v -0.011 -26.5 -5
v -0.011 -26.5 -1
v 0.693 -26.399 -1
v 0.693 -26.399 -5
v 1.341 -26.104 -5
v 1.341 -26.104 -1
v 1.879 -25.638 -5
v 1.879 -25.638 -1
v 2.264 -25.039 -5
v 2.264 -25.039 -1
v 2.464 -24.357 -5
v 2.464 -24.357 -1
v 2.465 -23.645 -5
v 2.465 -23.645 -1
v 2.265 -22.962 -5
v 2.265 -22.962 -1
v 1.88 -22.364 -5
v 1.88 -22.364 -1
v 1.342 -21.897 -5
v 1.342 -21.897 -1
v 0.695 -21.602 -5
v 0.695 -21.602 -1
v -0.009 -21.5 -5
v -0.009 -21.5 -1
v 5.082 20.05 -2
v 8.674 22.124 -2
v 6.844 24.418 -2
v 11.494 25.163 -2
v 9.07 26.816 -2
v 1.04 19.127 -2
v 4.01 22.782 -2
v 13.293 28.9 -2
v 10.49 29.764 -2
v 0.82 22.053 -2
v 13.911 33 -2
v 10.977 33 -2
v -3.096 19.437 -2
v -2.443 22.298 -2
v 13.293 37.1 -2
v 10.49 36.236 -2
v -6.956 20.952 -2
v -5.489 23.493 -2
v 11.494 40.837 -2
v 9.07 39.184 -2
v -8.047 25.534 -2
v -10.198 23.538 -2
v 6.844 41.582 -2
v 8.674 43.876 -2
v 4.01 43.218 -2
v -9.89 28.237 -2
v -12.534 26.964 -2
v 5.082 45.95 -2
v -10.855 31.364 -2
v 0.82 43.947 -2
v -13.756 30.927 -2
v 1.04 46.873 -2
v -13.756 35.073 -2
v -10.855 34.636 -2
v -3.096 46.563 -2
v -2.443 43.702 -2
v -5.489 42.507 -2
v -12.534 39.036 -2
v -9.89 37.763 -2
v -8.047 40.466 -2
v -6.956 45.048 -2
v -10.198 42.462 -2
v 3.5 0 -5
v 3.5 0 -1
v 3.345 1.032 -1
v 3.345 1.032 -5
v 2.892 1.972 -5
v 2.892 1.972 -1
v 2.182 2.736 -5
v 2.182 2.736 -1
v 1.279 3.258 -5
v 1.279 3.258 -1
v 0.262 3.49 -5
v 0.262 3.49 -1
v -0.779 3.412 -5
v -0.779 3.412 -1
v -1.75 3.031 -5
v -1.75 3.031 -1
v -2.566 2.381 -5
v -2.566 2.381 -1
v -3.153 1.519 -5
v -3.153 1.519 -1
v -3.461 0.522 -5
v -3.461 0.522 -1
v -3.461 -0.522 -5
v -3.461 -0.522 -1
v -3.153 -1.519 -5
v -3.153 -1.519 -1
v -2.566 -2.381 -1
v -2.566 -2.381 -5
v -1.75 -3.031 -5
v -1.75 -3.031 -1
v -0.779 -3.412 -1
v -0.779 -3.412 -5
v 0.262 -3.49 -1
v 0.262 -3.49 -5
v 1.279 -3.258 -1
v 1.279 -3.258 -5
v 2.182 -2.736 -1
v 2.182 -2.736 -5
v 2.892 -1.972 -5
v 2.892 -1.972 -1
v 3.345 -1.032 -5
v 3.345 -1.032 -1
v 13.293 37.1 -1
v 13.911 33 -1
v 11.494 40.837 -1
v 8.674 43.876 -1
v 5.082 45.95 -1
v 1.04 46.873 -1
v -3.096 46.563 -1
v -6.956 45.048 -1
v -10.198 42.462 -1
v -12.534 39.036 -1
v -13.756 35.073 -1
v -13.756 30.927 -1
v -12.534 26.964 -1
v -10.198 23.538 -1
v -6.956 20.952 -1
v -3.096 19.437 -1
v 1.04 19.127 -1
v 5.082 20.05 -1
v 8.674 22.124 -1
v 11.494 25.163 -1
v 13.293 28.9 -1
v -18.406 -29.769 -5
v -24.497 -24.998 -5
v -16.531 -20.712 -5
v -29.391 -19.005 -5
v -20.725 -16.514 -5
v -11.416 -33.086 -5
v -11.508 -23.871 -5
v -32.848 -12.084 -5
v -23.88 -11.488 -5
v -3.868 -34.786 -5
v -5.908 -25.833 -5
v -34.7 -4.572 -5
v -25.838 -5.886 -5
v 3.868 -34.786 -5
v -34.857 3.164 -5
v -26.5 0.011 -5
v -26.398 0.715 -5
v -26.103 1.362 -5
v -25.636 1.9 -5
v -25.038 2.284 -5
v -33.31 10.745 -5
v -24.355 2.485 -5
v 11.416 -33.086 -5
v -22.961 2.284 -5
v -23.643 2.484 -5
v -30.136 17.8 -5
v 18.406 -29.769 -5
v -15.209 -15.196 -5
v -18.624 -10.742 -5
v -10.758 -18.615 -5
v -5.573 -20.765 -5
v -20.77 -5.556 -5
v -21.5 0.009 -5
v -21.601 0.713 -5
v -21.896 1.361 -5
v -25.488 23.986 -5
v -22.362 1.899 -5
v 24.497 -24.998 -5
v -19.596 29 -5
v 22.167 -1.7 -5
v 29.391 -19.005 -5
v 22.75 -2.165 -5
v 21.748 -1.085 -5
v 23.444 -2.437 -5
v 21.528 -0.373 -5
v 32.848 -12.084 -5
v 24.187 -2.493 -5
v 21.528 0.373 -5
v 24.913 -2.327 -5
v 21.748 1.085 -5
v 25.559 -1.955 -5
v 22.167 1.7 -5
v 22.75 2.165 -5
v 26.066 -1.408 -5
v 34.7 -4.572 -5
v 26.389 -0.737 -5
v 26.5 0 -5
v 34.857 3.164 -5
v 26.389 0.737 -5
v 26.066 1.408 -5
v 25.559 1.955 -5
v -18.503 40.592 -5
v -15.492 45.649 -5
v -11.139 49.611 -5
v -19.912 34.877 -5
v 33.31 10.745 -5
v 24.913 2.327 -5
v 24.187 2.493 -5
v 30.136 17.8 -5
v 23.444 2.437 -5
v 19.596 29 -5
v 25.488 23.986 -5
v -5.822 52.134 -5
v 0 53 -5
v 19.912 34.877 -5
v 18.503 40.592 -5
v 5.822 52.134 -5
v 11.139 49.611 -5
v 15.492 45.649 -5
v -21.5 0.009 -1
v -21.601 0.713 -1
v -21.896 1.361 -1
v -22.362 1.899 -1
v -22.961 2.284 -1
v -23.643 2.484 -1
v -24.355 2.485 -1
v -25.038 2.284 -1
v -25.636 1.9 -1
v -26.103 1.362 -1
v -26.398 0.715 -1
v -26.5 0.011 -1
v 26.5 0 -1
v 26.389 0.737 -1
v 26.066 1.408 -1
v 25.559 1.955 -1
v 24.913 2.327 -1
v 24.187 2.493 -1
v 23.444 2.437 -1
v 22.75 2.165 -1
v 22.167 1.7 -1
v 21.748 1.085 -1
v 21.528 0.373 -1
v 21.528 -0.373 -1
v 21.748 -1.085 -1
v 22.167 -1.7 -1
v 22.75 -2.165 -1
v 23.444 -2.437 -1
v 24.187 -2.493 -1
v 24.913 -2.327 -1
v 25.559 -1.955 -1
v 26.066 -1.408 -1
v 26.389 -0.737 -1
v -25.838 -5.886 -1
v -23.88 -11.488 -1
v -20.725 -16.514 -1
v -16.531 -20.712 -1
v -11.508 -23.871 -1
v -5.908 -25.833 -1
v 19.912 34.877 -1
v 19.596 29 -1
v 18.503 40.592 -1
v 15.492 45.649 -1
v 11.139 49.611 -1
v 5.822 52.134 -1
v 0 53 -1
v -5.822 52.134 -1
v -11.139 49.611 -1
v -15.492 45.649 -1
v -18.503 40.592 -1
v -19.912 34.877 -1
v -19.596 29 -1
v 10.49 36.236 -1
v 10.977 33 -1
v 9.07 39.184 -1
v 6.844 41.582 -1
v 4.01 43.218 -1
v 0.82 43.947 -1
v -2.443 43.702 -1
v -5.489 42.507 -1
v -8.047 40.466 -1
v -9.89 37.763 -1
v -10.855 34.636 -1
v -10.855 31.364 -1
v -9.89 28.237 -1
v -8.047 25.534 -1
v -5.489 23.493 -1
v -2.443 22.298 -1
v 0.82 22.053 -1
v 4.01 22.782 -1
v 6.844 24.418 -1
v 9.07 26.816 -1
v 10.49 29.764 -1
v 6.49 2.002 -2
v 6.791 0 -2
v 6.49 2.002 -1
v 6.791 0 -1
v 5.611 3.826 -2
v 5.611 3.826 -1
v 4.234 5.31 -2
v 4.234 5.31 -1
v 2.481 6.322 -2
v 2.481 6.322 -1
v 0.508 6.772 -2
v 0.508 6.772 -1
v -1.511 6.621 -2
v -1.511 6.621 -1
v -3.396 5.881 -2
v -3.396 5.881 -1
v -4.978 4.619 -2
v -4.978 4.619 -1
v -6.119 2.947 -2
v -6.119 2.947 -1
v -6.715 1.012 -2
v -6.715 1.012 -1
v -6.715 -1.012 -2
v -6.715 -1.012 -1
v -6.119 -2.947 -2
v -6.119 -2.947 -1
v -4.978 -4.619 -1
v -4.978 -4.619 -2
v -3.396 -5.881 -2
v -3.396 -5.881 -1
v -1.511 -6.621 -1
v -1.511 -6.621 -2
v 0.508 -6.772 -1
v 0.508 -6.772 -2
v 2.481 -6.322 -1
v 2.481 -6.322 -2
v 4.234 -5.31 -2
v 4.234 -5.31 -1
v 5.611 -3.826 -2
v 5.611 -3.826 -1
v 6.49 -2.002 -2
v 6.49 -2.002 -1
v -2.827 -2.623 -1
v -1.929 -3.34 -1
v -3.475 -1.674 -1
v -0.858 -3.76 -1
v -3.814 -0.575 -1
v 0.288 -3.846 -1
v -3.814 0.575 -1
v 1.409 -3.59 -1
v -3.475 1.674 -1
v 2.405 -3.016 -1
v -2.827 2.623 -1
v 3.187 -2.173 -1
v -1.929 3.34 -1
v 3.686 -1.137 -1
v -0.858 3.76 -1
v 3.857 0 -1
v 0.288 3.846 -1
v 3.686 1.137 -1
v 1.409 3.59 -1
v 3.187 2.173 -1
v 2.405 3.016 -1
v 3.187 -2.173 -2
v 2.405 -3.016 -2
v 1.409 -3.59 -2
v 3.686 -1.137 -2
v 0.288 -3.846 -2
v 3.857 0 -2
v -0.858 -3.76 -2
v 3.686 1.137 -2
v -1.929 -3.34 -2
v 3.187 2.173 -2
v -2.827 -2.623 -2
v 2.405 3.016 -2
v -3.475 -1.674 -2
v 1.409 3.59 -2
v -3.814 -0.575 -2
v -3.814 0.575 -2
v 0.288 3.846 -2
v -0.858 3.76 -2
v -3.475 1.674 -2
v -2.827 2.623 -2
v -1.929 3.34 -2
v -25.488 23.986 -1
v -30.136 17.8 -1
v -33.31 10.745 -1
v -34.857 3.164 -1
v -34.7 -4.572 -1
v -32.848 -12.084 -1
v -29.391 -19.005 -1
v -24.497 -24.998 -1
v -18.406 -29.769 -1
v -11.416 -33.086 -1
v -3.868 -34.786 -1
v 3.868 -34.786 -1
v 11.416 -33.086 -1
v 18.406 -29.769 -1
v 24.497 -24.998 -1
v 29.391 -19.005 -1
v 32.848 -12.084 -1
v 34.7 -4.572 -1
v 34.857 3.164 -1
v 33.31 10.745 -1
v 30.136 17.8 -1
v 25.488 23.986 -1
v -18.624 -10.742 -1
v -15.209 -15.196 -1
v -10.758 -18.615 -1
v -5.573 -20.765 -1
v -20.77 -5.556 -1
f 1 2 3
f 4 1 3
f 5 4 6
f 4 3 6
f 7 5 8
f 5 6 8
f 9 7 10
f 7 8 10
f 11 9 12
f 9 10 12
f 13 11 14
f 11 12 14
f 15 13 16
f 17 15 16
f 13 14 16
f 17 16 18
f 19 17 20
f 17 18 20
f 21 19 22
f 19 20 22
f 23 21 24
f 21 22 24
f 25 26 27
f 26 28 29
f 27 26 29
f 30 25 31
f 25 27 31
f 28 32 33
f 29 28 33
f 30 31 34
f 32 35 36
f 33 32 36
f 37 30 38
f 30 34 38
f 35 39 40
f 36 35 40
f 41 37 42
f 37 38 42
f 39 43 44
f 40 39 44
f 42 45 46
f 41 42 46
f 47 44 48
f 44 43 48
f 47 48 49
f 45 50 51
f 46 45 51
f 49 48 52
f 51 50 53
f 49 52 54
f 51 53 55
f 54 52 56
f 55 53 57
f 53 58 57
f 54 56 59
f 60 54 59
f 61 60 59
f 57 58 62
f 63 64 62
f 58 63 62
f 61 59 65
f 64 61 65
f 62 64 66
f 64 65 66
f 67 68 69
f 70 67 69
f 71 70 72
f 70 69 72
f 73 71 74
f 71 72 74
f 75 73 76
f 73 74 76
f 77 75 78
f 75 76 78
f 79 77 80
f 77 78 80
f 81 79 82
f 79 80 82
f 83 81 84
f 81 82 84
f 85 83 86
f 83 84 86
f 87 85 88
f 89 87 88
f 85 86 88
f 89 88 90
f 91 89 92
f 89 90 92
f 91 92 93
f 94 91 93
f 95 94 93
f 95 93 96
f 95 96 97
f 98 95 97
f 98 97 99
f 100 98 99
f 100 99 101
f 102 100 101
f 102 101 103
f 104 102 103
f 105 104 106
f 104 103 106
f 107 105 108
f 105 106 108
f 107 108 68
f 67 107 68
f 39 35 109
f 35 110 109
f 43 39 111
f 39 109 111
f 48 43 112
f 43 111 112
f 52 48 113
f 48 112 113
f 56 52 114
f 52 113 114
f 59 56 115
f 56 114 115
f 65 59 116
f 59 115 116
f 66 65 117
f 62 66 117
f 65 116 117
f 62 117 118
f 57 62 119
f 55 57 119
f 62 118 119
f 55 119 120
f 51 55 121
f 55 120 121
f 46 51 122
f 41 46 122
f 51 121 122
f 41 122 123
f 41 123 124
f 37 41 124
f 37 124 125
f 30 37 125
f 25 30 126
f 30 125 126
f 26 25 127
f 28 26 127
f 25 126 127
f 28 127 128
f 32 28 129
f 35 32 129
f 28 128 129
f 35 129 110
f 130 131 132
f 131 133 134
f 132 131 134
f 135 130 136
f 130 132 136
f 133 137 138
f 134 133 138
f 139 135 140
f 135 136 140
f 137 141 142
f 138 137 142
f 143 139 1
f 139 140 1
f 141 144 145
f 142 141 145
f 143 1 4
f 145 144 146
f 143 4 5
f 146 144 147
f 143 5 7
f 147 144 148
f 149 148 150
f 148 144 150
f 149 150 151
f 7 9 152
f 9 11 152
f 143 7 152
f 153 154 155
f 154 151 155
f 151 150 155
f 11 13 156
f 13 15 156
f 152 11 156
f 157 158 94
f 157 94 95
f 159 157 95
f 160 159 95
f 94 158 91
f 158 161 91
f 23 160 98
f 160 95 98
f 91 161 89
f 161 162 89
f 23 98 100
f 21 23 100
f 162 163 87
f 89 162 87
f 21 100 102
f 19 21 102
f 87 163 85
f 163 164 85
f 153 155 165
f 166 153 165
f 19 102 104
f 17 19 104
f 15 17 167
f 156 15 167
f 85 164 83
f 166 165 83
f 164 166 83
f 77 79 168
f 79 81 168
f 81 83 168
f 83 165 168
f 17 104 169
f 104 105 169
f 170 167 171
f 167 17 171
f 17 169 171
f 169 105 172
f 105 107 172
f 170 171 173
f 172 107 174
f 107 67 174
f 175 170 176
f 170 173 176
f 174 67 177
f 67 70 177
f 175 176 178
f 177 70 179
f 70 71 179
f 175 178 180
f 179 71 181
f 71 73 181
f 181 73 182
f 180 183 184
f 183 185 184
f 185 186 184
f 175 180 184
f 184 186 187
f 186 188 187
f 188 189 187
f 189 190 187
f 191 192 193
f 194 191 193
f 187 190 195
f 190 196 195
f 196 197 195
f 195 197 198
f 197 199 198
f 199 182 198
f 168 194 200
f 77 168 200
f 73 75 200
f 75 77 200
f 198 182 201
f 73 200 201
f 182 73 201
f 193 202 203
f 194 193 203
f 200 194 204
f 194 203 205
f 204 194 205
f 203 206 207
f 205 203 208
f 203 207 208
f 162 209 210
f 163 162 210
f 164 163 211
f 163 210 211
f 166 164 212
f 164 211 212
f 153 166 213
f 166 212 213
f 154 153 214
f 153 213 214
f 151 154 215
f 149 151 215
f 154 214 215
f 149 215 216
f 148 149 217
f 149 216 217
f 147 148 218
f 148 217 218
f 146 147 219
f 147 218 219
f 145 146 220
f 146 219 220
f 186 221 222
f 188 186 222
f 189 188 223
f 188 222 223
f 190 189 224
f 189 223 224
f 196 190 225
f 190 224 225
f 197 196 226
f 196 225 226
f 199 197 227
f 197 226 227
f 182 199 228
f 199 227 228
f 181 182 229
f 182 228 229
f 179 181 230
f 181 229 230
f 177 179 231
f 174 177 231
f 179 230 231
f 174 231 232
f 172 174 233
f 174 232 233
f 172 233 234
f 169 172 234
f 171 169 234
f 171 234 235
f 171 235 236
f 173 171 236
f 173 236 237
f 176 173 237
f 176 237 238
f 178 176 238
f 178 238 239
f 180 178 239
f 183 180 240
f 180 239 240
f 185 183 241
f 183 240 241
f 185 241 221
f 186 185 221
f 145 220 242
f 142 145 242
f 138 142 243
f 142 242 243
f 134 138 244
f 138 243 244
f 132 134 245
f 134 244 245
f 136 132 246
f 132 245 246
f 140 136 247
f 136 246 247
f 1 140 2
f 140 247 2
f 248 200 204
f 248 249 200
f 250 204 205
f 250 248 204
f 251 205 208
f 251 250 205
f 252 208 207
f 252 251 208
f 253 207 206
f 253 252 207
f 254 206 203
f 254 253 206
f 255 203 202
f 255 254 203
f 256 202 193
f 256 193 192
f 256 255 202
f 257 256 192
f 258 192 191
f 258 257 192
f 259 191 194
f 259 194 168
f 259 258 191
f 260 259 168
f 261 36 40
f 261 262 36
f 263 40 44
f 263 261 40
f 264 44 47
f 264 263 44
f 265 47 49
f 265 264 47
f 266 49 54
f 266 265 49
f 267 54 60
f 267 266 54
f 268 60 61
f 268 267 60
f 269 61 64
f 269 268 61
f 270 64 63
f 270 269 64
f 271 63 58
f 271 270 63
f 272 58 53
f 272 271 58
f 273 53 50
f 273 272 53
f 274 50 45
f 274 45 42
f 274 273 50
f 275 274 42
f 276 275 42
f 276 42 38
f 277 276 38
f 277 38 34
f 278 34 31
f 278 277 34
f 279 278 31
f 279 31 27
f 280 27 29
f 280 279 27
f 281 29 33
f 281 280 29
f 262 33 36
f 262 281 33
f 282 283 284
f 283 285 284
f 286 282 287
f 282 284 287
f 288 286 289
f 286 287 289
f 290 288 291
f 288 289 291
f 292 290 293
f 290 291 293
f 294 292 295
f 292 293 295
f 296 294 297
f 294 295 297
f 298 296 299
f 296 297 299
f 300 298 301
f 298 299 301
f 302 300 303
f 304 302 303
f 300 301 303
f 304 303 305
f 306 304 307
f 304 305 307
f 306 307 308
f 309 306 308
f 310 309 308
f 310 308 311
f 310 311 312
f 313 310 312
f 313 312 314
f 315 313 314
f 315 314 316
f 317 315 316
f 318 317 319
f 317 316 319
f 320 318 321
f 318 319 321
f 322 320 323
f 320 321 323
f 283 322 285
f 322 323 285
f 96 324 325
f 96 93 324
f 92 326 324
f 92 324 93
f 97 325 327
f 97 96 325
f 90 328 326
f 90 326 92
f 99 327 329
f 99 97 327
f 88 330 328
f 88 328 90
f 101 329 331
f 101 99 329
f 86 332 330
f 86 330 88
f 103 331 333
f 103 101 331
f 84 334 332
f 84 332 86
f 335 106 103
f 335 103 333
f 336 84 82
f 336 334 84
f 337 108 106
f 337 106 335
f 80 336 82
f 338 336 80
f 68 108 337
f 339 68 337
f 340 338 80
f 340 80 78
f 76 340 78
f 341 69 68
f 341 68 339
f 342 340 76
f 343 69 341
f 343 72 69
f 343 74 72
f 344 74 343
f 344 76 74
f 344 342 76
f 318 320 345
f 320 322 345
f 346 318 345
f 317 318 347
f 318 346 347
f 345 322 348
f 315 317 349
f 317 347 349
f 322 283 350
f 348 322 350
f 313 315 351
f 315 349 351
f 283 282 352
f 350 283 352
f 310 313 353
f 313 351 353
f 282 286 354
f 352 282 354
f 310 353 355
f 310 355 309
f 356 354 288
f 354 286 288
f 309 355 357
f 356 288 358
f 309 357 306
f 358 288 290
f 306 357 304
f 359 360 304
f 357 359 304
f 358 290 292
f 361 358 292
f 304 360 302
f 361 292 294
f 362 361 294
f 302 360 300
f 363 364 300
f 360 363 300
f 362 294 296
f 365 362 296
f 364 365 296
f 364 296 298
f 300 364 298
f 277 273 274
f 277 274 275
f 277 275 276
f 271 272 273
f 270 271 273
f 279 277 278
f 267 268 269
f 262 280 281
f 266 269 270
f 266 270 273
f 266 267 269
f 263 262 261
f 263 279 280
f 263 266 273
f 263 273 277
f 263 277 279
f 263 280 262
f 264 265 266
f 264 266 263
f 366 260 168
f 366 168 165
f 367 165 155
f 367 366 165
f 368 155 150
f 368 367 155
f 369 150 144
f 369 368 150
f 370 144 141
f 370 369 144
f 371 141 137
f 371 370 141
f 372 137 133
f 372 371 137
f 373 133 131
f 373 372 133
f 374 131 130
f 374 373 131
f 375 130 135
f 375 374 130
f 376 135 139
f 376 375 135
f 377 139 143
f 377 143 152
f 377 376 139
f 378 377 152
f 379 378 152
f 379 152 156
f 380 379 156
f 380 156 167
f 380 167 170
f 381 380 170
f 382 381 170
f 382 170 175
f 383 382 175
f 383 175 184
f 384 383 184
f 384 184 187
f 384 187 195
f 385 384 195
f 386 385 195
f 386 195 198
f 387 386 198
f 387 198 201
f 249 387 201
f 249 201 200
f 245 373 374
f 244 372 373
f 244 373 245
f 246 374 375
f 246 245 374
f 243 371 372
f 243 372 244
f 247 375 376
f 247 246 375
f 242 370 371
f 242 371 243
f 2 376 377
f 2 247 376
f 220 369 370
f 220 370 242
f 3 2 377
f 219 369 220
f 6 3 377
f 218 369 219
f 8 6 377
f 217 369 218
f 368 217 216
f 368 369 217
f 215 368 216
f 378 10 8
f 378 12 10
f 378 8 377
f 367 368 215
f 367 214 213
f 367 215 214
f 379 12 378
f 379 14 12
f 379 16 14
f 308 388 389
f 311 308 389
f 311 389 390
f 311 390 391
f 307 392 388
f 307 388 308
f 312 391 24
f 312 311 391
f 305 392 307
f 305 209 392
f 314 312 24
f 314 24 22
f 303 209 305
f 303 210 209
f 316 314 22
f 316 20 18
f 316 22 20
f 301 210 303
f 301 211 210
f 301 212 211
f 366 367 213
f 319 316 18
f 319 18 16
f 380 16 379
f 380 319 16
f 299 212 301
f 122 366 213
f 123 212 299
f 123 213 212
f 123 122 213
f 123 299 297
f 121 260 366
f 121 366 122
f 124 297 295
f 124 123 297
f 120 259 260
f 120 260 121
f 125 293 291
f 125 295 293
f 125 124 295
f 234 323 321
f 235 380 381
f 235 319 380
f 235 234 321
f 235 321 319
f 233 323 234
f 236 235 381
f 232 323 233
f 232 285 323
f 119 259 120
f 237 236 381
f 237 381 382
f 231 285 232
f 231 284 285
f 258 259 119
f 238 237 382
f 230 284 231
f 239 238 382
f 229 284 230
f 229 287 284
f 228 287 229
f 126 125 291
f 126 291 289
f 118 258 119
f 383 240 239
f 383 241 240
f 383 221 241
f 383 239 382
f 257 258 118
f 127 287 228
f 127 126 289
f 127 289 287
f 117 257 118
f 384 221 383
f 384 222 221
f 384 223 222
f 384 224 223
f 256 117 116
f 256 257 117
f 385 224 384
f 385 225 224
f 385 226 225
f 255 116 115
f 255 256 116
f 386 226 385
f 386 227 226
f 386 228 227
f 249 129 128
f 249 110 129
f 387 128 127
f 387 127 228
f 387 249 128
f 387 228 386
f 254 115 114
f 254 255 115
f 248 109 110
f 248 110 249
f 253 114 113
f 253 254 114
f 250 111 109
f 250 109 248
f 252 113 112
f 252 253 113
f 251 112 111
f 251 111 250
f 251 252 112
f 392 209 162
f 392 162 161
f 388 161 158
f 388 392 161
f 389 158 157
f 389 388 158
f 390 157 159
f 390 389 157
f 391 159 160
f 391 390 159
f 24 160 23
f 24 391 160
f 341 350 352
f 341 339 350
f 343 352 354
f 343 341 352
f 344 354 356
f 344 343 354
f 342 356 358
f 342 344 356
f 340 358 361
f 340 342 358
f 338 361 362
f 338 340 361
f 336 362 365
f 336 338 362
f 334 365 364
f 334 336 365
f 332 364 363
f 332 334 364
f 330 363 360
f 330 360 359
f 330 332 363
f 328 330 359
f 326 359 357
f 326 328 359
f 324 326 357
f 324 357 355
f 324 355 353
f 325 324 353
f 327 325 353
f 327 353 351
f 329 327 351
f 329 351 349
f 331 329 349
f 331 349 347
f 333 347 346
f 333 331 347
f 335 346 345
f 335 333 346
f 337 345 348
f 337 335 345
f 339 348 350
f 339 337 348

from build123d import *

# Parameters (mm, degrees)
SKETCH020_W   = 2.93428
SKETCH020_H   = 1
SKETCH021_W   = 2.93428
SKETCH021_H   = 1
SKETCH017_R   = 35
SKETCH017_R_2 = 2.5
SKETCH017_R_3 = 3.5
PAD_DEPTH     = 4
SKETCH018_R   = 20
PAD015_DEPTH  = 4


with BuildPart() as bearing_race_differential:
    # Sketch020 → Revolution008 (revolve)
    with BuildSketch(Plane(origin=(0, 33, -0.5), x_dir=(1, 0, 0), z_dir=(0, -1, 0))):
        with Locations((12.444345, -1)):
            Rectangle(SKETCH020_W, SKETCH020_H)
    revolve(axis=Axis((0, 33, -0.5), (0, 0, 1)))


with BuildPart() as bearing_races:
    # Sketch021 → Revolution009 (revolve)
    with BuildSketch(Plane(origin=(0, 0, -0.5), x_dir=(1, 0, 0), z_dir=(0, -1, 0))):
        with Locations((5.324198, -1)):
            Rectangle(SKETCH021_W, SKETCH021_H)
    revolve(axis=Axis((0, 0, -0.5), (0, 0, 1)))

    # Fusion015: union bearing race - differential
    add(bearing_race_differential.part)


with BuildPart() as main:
    # Sketch017 → Pad (new body)
    with BuildSketch(Plane.XY.offset(-1)):
        Circle(SKETCH017_R)
        with Locations((24, 0)):
            Circle(SKETCH017_R_2, mode=Mode.SUBTRACT)
        Circle(SKETCH017_R_3, mode=Mode.SUBTRACT)
        with BuildLine():
            ThreePointArc((-26.499998, 0.011018), (-18.746119, -18.730537), (-0.011018, -26.499998))
            ThreePointArc((-0.011018, -26.499998), (2.490021, -24.001037), (-0.008939, -21.499998))
            ThreePointArc((-21.499998, 0.008939), (-15.209115, -15.196474), (-0.008939, -21.499998))
            ThreePointArc((-21.499998, 0.008939), (-23.998959, 2.509978), (-26.499998, 0.011018))
        make_face(mode=Mode.SUBTRACT)
    extrude(amount=-PAD_DEPTH)


with BuildPart() as cut011002005:
    # Sketch018 → Pad015 (new body)
    with BuildSketch(Plane.XY.offset(-1)):
        with Locations((0, 33)):
            Circle(SKETCH018_R)
    extrude(amount=-PAD015_DEPTH)

    # Fusion: union Main
    add(main.part)

    # Cut011002005: cut bearing races
    add(bearing_races.part, mode=Mode.SUBTRACT)


solid = cut011002005.part
